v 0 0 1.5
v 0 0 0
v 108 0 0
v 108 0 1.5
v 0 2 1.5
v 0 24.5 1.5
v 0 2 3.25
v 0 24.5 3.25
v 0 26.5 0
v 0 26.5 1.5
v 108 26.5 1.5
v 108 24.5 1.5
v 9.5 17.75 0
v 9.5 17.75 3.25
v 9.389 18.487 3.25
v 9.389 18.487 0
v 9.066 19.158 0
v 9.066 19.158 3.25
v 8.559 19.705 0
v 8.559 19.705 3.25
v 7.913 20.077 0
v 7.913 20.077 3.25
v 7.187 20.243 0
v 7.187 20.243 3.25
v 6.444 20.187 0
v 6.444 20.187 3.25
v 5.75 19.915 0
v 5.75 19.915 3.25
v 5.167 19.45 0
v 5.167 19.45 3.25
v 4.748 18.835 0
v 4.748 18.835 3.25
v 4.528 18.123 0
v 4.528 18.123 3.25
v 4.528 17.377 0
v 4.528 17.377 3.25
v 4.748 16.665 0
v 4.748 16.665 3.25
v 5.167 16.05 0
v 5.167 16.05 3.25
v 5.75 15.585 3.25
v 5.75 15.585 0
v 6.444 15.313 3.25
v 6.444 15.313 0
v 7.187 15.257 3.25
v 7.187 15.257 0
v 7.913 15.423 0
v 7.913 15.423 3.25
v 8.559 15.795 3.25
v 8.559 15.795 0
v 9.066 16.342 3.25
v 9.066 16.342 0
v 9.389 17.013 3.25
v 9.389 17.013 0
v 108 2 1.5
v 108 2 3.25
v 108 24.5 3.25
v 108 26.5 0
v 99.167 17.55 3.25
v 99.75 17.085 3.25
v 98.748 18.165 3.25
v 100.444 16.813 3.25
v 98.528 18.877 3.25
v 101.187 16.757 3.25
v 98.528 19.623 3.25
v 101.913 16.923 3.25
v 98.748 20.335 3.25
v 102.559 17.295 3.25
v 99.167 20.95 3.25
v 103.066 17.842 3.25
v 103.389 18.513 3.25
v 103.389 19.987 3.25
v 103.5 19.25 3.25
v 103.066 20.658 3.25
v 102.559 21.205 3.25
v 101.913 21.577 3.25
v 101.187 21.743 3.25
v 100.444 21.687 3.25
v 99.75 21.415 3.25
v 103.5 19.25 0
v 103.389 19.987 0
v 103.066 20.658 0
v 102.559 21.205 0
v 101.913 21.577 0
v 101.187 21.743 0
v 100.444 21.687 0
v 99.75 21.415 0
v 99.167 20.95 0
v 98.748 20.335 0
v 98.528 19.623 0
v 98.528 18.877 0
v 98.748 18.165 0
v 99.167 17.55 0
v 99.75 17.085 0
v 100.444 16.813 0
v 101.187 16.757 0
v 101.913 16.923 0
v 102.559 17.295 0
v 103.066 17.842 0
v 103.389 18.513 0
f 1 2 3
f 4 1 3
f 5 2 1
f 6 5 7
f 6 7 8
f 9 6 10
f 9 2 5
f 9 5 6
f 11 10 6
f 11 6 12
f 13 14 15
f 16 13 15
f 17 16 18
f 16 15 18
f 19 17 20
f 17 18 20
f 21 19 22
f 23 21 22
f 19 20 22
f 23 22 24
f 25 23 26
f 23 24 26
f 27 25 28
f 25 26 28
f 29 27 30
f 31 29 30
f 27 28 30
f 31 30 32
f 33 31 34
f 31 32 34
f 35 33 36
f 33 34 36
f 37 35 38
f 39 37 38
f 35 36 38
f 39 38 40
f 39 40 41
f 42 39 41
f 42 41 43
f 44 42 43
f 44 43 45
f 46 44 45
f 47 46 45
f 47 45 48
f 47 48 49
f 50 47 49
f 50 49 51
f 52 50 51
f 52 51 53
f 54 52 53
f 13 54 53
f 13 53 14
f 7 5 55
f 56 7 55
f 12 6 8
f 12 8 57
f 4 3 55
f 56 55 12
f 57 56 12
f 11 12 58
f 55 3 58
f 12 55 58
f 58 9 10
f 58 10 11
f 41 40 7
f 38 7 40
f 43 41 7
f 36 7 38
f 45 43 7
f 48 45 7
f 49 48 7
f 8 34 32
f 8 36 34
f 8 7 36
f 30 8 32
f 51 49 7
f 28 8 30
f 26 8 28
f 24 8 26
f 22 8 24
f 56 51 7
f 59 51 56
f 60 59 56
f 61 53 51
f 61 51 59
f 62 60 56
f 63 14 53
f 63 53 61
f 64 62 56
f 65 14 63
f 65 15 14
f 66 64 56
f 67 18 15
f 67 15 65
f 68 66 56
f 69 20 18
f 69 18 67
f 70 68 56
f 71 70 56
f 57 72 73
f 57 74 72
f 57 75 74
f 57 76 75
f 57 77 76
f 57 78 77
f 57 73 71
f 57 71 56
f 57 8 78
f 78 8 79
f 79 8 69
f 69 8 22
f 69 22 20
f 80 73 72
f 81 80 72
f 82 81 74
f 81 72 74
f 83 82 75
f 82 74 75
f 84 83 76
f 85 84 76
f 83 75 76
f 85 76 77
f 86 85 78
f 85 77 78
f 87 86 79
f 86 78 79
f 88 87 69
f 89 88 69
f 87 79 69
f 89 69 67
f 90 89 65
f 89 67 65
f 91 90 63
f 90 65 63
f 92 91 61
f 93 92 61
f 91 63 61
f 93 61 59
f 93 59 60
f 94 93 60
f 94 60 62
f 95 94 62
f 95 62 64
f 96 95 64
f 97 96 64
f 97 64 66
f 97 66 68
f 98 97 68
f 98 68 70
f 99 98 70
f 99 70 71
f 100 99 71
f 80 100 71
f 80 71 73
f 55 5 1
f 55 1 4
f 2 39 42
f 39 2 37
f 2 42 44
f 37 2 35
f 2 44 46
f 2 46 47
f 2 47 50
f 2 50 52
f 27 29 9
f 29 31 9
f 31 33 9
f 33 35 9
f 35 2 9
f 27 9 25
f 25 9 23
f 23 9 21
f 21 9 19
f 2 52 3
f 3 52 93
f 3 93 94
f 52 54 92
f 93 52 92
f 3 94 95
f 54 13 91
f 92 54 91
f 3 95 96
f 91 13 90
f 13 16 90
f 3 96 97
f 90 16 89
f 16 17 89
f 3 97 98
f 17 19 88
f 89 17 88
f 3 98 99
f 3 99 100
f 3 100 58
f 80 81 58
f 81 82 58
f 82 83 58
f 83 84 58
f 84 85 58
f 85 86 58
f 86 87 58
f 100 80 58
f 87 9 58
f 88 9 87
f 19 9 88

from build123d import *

# Parameters (mm, degrees)
SKETCH_W     = 108
SKETCH_H     = 26.5
PAD_DEPTH    = 1.5
SKETCH001_W  = 108
SKETCH001_H  = 22.5
PAD001_DEPTH = 1.75
SKETCH002_R  = 2.5
POCKET_DEPTH = 3.251


with BuildPart() as part:
    # Sketch → Pad (new body)
    with BuildSketch(Plane.XY):
        with Locations((54, 13.25)):
            Rectangle(SKETCH_W, SKETCH_H)
    extrude(amount=PAD_DEPTH)

    # Sketch001 (on Face6 of Pad) → Pad001 (join)
    with BuildSketch(Plane.XY.offset(1.5)):
        with Locations((54, 13.25)):
            Rectangle(SKETCH001_W, SKETCH001_H)
    extrude(amount=PAD001_DEPTH)

    # Sketch002 (on Face12 of Pad001) → Pocket (cut, through all)
    with BuildSketch(Plane.XY.offset(3.25)):
        with Locations((101, 19.25)):
            Circle(SKETCH002_R)
        with Locations((7, 17.75)):
            Circle(SKETCH002_R)
    extrude(amount=-POCKET_DEPTH, mode=Mode.SUBTRACT)


solid = part.part
